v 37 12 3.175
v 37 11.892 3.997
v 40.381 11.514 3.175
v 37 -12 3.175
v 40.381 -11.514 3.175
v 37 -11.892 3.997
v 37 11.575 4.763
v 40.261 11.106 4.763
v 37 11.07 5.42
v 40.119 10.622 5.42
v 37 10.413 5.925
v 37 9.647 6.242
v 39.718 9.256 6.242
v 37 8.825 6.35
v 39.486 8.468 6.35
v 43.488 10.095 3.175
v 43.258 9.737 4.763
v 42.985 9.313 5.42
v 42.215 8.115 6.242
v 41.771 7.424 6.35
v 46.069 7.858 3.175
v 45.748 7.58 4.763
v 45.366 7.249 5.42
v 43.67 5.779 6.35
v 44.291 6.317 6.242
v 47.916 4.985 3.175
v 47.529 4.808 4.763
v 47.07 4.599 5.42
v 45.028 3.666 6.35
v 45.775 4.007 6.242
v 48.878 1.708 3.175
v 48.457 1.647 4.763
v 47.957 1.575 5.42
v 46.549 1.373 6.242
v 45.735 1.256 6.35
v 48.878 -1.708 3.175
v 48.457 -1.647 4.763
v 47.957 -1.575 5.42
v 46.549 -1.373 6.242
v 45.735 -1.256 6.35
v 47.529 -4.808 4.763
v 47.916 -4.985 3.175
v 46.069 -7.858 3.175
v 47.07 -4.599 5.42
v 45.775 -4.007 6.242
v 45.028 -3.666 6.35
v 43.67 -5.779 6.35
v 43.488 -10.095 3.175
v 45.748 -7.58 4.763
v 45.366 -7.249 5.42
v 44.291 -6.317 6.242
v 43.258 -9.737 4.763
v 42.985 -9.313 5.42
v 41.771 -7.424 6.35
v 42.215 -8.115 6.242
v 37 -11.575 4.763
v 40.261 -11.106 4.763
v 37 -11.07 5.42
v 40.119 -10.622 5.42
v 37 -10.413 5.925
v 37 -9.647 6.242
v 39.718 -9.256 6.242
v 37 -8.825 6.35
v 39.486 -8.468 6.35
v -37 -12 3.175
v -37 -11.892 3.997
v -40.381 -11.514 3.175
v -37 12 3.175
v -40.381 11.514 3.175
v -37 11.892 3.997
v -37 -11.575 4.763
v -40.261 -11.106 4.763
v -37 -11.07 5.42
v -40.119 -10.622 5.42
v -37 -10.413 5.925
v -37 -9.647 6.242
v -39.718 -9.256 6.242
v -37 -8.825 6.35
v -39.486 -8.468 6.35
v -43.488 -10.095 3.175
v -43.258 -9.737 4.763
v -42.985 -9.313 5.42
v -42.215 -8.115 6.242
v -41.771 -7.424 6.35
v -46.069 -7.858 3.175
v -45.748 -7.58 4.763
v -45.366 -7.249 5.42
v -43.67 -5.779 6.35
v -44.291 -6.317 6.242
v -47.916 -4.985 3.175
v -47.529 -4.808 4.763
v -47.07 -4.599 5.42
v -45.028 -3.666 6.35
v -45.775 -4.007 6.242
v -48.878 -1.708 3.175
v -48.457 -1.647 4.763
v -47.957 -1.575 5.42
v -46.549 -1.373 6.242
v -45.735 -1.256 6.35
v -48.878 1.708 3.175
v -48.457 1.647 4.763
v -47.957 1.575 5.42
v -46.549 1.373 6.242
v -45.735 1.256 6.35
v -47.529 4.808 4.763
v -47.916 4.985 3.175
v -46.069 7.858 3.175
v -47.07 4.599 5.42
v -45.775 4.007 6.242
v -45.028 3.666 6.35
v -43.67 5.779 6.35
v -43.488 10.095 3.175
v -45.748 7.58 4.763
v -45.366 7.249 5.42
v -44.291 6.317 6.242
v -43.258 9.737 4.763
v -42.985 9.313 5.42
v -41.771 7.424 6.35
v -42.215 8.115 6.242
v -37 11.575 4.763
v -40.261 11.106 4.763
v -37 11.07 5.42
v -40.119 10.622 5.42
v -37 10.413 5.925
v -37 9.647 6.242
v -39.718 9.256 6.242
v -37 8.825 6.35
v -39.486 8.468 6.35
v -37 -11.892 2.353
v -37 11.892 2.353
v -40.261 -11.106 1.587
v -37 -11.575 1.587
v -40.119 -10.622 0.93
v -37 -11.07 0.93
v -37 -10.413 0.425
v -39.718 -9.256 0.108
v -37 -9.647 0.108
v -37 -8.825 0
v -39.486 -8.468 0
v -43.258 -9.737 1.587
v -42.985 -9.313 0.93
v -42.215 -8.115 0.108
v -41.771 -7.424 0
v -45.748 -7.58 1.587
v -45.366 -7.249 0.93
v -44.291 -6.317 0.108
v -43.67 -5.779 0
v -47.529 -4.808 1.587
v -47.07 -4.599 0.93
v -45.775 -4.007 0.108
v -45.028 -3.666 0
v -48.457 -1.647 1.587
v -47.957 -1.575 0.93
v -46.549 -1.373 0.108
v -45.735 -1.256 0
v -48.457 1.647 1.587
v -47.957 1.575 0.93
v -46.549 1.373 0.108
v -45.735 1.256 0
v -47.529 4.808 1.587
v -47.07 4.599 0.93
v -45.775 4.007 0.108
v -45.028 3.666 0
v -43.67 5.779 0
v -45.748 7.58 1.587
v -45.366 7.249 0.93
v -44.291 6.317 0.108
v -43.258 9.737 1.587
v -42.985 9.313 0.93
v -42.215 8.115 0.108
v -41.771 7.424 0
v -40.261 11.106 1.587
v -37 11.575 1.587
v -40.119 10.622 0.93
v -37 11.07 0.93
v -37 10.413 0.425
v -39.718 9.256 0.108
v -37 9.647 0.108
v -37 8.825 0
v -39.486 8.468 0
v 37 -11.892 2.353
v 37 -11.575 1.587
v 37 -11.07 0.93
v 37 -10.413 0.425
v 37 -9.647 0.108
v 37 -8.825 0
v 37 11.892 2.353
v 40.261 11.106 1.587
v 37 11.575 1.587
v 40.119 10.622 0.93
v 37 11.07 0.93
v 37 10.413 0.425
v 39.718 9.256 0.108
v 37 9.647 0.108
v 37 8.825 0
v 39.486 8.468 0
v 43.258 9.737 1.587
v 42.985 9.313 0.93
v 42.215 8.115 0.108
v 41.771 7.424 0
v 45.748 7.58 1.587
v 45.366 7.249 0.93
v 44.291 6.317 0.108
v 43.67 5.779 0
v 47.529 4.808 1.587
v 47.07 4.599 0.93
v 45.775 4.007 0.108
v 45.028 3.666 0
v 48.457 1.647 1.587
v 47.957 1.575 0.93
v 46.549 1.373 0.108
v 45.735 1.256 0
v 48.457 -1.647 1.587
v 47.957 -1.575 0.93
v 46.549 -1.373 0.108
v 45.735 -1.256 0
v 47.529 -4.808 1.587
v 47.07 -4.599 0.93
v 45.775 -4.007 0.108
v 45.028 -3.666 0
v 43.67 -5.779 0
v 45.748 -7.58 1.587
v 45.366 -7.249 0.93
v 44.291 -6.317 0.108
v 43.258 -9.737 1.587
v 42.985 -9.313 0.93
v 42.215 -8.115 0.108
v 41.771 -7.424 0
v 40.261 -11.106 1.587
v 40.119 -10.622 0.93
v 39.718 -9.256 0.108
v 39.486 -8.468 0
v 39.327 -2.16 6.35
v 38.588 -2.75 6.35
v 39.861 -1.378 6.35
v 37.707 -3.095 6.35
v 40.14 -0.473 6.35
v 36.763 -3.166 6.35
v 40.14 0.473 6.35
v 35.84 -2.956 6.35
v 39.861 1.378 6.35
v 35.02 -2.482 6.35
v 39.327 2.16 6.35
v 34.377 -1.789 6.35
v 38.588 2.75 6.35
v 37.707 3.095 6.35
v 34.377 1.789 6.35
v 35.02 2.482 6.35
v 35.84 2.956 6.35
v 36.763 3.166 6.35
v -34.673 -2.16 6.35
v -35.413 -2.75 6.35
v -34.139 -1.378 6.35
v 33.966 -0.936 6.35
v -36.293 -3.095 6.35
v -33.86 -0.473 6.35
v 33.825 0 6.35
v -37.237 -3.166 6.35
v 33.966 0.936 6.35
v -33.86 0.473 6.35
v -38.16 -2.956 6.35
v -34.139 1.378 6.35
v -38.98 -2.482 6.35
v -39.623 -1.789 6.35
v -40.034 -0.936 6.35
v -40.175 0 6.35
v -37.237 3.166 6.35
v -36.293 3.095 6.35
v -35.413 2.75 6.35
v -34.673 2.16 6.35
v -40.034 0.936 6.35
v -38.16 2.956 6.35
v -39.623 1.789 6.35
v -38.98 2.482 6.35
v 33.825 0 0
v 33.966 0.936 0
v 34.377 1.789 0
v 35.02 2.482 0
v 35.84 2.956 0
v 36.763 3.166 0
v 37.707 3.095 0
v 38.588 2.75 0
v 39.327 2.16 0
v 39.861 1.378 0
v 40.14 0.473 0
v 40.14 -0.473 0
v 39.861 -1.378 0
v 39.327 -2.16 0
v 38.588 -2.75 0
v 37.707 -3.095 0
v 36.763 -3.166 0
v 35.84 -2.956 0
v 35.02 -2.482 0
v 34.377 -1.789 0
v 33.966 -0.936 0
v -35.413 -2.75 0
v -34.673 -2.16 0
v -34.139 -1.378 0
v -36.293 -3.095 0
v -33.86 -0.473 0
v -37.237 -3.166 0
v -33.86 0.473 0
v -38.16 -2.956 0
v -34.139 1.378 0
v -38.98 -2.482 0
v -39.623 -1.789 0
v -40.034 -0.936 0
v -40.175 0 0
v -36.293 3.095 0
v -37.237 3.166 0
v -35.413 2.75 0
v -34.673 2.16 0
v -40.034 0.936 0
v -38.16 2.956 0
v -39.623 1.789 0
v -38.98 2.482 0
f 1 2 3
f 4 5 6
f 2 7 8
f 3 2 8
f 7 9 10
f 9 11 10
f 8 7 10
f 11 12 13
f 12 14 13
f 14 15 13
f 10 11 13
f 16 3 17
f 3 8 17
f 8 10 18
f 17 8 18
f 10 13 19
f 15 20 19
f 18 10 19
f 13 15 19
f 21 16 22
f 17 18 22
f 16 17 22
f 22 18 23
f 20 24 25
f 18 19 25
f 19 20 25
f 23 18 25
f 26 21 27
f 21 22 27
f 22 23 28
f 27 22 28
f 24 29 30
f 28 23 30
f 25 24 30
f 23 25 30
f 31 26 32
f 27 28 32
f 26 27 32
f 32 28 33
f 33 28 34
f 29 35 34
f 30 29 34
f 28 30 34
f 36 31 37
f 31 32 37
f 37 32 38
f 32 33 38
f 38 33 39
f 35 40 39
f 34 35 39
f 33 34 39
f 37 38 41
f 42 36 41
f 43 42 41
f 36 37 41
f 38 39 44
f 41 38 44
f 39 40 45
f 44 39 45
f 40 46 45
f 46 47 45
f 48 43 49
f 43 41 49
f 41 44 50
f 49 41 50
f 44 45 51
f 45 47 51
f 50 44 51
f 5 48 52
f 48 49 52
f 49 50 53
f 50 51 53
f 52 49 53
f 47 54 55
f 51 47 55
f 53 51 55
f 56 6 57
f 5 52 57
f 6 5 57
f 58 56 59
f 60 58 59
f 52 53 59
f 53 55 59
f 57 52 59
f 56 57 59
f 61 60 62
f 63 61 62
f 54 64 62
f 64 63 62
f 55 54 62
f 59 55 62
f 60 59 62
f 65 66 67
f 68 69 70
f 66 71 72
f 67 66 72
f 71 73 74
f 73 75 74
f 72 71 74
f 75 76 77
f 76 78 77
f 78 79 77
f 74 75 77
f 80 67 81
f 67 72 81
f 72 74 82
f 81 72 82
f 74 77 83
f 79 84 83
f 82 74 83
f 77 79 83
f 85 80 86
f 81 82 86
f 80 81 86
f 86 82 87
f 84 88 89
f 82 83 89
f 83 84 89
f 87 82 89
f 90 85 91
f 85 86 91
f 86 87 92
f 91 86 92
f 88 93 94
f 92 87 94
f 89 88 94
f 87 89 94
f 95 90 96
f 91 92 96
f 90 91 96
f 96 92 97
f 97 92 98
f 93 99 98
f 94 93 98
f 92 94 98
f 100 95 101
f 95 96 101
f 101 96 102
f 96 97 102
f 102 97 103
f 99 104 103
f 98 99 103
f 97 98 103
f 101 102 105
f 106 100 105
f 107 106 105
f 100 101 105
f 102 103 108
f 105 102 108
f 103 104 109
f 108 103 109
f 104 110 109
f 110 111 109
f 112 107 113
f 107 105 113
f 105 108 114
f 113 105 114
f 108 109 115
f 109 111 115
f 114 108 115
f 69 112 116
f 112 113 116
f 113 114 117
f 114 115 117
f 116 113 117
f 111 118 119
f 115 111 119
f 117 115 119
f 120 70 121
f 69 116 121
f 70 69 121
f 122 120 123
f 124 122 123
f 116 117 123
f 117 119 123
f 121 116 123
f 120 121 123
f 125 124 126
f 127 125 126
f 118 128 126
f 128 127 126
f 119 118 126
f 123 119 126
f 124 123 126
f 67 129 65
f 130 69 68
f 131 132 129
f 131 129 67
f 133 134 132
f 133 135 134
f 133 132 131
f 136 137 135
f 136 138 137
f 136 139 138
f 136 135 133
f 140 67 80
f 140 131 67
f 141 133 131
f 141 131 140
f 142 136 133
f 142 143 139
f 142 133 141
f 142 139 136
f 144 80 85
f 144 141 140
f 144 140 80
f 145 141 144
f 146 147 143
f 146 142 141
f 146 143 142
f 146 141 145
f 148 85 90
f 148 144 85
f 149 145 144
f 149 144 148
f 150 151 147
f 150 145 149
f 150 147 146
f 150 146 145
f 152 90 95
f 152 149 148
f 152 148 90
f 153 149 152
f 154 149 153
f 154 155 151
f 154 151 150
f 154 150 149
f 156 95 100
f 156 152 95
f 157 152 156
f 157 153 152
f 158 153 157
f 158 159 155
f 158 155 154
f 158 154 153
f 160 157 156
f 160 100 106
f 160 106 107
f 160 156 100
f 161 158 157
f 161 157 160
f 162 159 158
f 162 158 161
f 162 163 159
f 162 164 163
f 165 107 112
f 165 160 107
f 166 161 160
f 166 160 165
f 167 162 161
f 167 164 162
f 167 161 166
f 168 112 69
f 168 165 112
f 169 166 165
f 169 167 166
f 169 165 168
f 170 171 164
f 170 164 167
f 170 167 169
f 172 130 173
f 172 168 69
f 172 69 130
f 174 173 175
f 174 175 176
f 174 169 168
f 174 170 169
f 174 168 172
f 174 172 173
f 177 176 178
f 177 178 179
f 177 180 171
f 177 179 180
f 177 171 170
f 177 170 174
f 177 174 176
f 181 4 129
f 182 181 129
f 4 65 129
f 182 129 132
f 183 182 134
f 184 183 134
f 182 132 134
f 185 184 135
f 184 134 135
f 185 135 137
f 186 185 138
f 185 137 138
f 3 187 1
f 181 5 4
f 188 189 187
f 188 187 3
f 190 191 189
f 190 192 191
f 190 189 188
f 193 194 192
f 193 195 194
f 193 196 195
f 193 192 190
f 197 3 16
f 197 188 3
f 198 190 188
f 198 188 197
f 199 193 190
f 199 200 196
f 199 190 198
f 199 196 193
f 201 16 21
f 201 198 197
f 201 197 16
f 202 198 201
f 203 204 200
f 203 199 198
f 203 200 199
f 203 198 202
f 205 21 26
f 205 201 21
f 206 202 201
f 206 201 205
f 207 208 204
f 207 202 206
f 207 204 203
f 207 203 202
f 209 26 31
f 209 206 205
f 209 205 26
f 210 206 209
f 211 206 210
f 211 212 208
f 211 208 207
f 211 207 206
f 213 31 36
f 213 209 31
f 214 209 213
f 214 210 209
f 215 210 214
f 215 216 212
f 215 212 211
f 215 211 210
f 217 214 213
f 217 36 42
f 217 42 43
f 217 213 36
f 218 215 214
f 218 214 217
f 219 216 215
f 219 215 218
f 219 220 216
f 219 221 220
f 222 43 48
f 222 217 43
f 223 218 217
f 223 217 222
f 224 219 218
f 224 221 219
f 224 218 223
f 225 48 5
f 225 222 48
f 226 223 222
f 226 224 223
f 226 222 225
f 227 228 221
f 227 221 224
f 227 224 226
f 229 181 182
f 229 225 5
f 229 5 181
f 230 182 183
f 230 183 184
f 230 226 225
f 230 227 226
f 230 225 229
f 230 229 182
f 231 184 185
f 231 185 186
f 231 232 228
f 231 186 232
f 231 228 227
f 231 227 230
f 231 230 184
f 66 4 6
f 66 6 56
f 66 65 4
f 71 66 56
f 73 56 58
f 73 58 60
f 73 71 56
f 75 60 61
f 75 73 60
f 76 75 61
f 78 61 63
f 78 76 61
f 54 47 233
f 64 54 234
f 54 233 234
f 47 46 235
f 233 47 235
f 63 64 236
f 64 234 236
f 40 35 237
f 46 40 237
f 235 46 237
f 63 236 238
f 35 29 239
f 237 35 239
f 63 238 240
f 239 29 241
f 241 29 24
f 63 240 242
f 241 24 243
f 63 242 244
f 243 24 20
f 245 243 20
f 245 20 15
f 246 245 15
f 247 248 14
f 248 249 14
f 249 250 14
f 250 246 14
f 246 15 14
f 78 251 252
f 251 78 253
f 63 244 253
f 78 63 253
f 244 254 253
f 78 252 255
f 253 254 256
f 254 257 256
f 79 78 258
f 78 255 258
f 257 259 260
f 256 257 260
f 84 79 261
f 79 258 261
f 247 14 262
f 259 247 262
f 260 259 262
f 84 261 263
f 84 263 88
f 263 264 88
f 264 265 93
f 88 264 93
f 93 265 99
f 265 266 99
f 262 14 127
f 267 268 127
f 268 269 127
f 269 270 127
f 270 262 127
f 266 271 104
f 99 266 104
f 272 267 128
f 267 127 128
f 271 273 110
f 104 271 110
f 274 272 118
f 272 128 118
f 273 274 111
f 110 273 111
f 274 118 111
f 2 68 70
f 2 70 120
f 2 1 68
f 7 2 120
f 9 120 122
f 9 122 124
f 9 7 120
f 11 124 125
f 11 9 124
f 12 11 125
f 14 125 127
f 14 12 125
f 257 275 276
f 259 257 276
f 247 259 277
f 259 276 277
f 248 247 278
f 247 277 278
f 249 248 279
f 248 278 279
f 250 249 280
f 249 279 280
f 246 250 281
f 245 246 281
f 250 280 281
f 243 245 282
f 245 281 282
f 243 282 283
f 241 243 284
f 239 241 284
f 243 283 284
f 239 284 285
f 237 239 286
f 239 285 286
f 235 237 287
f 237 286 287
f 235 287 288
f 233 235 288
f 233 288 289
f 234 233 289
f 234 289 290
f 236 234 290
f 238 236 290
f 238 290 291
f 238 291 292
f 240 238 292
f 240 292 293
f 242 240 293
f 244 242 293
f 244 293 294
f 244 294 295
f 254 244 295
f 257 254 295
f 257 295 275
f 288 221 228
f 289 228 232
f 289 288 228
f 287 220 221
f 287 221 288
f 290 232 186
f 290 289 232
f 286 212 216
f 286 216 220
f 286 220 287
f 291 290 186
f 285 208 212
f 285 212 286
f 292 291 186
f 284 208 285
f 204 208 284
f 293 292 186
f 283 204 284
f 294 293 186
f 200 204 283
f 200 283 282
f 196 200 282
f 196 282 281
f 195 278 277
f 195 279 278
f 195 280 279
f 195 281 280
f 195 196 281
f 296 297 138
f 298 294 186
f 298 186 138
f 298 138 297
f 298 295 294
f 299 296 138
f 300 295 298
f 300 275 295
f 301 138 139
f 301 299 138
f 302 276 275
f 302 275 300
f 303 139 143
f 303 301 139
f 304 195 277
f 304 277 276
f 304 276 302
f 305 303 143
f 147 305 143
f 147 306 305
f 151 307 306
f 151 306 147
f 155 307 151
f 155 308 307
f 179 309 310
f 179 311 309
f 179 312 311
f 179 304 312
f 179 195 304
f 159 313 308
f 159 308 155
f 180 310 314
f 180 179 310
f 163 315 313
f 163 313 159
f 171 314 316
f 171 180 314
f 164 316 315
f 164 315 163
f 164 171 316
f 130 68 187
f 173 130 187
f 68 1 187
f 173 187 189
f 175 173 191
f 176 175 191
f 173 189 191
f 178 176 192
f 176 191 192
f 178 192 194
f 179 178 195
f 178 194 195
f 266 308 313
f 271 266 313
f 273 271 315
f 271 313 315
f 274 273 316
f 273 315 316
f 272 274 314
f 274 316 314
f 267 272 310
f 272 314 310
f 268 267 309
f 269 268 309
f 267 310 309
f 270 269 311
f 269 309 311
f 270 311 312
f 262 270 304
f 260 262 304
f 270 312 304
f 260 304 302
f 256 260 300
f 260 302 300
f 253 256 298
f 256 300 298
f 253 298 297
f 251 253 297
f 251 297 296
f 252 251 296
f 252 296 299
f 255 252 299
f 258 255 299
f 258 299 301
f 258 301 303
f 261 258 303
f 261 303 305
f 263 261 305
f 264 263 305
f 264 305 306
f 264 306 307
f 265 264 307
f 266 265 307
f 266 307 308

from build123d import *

# Parameters (mm, degrees)
BOSS_EXTRUDE1_DEPTH         = 6.35
F_1_4_0_25_DIAMETER_HOLE1_D = 6.35
FILLET1_R                   = 3.175


with BuildPart() as part:
    # Sketch1 → Boss-Extrude1 (new body)
    with BuildSketch(Plane.XY):
        with BuildLine():
            Line((-37.000000041, 11.999999876), (37.000000041, 11.999999876))
            ThreePointArc((37.000000041, 11.999999876), (48.999999917, 0), (37.000000041, -11.999999876))
            Line((37.000000041, -11.999999876), (-37.000000041, -11.999999876))
            ThreePointArc((-37.000000041, -11.999999876), (-48.999999917, 0), (-37.000000041, 11.999999876))
        make_face()
    extrude(amount=BOSS_EXTRUDE1_DEPTH)

    # 1/4 (0.25) Diameter Hole1 (through all)
    with Locations(Plane.XY.offset(6.35)):
        with Locations((-37.000000041, 0), (37.000000041, 0)):
            Hole(F_1_4_0_25_DIAMETER_HOLE1_D / 2)

    # Fillet1
    fillet1_edges = [part.edges().sort_by_distance(p)[0] for p in [
        (48.999999917, 0, 6.35),
        (0, 11.999999876, 6.35),
        (-48.999999917, 0, 6.35),
        (0, 11.999999876, 0),
        (0, -11.999999876, 0),
        (0, -11.999999876, 6.35),
    ]]
    fillet(fillet1_edges, radius=FILLET1_R - 0.0001)  # a hair under: the kernel refuses the full size


solid = part.part
